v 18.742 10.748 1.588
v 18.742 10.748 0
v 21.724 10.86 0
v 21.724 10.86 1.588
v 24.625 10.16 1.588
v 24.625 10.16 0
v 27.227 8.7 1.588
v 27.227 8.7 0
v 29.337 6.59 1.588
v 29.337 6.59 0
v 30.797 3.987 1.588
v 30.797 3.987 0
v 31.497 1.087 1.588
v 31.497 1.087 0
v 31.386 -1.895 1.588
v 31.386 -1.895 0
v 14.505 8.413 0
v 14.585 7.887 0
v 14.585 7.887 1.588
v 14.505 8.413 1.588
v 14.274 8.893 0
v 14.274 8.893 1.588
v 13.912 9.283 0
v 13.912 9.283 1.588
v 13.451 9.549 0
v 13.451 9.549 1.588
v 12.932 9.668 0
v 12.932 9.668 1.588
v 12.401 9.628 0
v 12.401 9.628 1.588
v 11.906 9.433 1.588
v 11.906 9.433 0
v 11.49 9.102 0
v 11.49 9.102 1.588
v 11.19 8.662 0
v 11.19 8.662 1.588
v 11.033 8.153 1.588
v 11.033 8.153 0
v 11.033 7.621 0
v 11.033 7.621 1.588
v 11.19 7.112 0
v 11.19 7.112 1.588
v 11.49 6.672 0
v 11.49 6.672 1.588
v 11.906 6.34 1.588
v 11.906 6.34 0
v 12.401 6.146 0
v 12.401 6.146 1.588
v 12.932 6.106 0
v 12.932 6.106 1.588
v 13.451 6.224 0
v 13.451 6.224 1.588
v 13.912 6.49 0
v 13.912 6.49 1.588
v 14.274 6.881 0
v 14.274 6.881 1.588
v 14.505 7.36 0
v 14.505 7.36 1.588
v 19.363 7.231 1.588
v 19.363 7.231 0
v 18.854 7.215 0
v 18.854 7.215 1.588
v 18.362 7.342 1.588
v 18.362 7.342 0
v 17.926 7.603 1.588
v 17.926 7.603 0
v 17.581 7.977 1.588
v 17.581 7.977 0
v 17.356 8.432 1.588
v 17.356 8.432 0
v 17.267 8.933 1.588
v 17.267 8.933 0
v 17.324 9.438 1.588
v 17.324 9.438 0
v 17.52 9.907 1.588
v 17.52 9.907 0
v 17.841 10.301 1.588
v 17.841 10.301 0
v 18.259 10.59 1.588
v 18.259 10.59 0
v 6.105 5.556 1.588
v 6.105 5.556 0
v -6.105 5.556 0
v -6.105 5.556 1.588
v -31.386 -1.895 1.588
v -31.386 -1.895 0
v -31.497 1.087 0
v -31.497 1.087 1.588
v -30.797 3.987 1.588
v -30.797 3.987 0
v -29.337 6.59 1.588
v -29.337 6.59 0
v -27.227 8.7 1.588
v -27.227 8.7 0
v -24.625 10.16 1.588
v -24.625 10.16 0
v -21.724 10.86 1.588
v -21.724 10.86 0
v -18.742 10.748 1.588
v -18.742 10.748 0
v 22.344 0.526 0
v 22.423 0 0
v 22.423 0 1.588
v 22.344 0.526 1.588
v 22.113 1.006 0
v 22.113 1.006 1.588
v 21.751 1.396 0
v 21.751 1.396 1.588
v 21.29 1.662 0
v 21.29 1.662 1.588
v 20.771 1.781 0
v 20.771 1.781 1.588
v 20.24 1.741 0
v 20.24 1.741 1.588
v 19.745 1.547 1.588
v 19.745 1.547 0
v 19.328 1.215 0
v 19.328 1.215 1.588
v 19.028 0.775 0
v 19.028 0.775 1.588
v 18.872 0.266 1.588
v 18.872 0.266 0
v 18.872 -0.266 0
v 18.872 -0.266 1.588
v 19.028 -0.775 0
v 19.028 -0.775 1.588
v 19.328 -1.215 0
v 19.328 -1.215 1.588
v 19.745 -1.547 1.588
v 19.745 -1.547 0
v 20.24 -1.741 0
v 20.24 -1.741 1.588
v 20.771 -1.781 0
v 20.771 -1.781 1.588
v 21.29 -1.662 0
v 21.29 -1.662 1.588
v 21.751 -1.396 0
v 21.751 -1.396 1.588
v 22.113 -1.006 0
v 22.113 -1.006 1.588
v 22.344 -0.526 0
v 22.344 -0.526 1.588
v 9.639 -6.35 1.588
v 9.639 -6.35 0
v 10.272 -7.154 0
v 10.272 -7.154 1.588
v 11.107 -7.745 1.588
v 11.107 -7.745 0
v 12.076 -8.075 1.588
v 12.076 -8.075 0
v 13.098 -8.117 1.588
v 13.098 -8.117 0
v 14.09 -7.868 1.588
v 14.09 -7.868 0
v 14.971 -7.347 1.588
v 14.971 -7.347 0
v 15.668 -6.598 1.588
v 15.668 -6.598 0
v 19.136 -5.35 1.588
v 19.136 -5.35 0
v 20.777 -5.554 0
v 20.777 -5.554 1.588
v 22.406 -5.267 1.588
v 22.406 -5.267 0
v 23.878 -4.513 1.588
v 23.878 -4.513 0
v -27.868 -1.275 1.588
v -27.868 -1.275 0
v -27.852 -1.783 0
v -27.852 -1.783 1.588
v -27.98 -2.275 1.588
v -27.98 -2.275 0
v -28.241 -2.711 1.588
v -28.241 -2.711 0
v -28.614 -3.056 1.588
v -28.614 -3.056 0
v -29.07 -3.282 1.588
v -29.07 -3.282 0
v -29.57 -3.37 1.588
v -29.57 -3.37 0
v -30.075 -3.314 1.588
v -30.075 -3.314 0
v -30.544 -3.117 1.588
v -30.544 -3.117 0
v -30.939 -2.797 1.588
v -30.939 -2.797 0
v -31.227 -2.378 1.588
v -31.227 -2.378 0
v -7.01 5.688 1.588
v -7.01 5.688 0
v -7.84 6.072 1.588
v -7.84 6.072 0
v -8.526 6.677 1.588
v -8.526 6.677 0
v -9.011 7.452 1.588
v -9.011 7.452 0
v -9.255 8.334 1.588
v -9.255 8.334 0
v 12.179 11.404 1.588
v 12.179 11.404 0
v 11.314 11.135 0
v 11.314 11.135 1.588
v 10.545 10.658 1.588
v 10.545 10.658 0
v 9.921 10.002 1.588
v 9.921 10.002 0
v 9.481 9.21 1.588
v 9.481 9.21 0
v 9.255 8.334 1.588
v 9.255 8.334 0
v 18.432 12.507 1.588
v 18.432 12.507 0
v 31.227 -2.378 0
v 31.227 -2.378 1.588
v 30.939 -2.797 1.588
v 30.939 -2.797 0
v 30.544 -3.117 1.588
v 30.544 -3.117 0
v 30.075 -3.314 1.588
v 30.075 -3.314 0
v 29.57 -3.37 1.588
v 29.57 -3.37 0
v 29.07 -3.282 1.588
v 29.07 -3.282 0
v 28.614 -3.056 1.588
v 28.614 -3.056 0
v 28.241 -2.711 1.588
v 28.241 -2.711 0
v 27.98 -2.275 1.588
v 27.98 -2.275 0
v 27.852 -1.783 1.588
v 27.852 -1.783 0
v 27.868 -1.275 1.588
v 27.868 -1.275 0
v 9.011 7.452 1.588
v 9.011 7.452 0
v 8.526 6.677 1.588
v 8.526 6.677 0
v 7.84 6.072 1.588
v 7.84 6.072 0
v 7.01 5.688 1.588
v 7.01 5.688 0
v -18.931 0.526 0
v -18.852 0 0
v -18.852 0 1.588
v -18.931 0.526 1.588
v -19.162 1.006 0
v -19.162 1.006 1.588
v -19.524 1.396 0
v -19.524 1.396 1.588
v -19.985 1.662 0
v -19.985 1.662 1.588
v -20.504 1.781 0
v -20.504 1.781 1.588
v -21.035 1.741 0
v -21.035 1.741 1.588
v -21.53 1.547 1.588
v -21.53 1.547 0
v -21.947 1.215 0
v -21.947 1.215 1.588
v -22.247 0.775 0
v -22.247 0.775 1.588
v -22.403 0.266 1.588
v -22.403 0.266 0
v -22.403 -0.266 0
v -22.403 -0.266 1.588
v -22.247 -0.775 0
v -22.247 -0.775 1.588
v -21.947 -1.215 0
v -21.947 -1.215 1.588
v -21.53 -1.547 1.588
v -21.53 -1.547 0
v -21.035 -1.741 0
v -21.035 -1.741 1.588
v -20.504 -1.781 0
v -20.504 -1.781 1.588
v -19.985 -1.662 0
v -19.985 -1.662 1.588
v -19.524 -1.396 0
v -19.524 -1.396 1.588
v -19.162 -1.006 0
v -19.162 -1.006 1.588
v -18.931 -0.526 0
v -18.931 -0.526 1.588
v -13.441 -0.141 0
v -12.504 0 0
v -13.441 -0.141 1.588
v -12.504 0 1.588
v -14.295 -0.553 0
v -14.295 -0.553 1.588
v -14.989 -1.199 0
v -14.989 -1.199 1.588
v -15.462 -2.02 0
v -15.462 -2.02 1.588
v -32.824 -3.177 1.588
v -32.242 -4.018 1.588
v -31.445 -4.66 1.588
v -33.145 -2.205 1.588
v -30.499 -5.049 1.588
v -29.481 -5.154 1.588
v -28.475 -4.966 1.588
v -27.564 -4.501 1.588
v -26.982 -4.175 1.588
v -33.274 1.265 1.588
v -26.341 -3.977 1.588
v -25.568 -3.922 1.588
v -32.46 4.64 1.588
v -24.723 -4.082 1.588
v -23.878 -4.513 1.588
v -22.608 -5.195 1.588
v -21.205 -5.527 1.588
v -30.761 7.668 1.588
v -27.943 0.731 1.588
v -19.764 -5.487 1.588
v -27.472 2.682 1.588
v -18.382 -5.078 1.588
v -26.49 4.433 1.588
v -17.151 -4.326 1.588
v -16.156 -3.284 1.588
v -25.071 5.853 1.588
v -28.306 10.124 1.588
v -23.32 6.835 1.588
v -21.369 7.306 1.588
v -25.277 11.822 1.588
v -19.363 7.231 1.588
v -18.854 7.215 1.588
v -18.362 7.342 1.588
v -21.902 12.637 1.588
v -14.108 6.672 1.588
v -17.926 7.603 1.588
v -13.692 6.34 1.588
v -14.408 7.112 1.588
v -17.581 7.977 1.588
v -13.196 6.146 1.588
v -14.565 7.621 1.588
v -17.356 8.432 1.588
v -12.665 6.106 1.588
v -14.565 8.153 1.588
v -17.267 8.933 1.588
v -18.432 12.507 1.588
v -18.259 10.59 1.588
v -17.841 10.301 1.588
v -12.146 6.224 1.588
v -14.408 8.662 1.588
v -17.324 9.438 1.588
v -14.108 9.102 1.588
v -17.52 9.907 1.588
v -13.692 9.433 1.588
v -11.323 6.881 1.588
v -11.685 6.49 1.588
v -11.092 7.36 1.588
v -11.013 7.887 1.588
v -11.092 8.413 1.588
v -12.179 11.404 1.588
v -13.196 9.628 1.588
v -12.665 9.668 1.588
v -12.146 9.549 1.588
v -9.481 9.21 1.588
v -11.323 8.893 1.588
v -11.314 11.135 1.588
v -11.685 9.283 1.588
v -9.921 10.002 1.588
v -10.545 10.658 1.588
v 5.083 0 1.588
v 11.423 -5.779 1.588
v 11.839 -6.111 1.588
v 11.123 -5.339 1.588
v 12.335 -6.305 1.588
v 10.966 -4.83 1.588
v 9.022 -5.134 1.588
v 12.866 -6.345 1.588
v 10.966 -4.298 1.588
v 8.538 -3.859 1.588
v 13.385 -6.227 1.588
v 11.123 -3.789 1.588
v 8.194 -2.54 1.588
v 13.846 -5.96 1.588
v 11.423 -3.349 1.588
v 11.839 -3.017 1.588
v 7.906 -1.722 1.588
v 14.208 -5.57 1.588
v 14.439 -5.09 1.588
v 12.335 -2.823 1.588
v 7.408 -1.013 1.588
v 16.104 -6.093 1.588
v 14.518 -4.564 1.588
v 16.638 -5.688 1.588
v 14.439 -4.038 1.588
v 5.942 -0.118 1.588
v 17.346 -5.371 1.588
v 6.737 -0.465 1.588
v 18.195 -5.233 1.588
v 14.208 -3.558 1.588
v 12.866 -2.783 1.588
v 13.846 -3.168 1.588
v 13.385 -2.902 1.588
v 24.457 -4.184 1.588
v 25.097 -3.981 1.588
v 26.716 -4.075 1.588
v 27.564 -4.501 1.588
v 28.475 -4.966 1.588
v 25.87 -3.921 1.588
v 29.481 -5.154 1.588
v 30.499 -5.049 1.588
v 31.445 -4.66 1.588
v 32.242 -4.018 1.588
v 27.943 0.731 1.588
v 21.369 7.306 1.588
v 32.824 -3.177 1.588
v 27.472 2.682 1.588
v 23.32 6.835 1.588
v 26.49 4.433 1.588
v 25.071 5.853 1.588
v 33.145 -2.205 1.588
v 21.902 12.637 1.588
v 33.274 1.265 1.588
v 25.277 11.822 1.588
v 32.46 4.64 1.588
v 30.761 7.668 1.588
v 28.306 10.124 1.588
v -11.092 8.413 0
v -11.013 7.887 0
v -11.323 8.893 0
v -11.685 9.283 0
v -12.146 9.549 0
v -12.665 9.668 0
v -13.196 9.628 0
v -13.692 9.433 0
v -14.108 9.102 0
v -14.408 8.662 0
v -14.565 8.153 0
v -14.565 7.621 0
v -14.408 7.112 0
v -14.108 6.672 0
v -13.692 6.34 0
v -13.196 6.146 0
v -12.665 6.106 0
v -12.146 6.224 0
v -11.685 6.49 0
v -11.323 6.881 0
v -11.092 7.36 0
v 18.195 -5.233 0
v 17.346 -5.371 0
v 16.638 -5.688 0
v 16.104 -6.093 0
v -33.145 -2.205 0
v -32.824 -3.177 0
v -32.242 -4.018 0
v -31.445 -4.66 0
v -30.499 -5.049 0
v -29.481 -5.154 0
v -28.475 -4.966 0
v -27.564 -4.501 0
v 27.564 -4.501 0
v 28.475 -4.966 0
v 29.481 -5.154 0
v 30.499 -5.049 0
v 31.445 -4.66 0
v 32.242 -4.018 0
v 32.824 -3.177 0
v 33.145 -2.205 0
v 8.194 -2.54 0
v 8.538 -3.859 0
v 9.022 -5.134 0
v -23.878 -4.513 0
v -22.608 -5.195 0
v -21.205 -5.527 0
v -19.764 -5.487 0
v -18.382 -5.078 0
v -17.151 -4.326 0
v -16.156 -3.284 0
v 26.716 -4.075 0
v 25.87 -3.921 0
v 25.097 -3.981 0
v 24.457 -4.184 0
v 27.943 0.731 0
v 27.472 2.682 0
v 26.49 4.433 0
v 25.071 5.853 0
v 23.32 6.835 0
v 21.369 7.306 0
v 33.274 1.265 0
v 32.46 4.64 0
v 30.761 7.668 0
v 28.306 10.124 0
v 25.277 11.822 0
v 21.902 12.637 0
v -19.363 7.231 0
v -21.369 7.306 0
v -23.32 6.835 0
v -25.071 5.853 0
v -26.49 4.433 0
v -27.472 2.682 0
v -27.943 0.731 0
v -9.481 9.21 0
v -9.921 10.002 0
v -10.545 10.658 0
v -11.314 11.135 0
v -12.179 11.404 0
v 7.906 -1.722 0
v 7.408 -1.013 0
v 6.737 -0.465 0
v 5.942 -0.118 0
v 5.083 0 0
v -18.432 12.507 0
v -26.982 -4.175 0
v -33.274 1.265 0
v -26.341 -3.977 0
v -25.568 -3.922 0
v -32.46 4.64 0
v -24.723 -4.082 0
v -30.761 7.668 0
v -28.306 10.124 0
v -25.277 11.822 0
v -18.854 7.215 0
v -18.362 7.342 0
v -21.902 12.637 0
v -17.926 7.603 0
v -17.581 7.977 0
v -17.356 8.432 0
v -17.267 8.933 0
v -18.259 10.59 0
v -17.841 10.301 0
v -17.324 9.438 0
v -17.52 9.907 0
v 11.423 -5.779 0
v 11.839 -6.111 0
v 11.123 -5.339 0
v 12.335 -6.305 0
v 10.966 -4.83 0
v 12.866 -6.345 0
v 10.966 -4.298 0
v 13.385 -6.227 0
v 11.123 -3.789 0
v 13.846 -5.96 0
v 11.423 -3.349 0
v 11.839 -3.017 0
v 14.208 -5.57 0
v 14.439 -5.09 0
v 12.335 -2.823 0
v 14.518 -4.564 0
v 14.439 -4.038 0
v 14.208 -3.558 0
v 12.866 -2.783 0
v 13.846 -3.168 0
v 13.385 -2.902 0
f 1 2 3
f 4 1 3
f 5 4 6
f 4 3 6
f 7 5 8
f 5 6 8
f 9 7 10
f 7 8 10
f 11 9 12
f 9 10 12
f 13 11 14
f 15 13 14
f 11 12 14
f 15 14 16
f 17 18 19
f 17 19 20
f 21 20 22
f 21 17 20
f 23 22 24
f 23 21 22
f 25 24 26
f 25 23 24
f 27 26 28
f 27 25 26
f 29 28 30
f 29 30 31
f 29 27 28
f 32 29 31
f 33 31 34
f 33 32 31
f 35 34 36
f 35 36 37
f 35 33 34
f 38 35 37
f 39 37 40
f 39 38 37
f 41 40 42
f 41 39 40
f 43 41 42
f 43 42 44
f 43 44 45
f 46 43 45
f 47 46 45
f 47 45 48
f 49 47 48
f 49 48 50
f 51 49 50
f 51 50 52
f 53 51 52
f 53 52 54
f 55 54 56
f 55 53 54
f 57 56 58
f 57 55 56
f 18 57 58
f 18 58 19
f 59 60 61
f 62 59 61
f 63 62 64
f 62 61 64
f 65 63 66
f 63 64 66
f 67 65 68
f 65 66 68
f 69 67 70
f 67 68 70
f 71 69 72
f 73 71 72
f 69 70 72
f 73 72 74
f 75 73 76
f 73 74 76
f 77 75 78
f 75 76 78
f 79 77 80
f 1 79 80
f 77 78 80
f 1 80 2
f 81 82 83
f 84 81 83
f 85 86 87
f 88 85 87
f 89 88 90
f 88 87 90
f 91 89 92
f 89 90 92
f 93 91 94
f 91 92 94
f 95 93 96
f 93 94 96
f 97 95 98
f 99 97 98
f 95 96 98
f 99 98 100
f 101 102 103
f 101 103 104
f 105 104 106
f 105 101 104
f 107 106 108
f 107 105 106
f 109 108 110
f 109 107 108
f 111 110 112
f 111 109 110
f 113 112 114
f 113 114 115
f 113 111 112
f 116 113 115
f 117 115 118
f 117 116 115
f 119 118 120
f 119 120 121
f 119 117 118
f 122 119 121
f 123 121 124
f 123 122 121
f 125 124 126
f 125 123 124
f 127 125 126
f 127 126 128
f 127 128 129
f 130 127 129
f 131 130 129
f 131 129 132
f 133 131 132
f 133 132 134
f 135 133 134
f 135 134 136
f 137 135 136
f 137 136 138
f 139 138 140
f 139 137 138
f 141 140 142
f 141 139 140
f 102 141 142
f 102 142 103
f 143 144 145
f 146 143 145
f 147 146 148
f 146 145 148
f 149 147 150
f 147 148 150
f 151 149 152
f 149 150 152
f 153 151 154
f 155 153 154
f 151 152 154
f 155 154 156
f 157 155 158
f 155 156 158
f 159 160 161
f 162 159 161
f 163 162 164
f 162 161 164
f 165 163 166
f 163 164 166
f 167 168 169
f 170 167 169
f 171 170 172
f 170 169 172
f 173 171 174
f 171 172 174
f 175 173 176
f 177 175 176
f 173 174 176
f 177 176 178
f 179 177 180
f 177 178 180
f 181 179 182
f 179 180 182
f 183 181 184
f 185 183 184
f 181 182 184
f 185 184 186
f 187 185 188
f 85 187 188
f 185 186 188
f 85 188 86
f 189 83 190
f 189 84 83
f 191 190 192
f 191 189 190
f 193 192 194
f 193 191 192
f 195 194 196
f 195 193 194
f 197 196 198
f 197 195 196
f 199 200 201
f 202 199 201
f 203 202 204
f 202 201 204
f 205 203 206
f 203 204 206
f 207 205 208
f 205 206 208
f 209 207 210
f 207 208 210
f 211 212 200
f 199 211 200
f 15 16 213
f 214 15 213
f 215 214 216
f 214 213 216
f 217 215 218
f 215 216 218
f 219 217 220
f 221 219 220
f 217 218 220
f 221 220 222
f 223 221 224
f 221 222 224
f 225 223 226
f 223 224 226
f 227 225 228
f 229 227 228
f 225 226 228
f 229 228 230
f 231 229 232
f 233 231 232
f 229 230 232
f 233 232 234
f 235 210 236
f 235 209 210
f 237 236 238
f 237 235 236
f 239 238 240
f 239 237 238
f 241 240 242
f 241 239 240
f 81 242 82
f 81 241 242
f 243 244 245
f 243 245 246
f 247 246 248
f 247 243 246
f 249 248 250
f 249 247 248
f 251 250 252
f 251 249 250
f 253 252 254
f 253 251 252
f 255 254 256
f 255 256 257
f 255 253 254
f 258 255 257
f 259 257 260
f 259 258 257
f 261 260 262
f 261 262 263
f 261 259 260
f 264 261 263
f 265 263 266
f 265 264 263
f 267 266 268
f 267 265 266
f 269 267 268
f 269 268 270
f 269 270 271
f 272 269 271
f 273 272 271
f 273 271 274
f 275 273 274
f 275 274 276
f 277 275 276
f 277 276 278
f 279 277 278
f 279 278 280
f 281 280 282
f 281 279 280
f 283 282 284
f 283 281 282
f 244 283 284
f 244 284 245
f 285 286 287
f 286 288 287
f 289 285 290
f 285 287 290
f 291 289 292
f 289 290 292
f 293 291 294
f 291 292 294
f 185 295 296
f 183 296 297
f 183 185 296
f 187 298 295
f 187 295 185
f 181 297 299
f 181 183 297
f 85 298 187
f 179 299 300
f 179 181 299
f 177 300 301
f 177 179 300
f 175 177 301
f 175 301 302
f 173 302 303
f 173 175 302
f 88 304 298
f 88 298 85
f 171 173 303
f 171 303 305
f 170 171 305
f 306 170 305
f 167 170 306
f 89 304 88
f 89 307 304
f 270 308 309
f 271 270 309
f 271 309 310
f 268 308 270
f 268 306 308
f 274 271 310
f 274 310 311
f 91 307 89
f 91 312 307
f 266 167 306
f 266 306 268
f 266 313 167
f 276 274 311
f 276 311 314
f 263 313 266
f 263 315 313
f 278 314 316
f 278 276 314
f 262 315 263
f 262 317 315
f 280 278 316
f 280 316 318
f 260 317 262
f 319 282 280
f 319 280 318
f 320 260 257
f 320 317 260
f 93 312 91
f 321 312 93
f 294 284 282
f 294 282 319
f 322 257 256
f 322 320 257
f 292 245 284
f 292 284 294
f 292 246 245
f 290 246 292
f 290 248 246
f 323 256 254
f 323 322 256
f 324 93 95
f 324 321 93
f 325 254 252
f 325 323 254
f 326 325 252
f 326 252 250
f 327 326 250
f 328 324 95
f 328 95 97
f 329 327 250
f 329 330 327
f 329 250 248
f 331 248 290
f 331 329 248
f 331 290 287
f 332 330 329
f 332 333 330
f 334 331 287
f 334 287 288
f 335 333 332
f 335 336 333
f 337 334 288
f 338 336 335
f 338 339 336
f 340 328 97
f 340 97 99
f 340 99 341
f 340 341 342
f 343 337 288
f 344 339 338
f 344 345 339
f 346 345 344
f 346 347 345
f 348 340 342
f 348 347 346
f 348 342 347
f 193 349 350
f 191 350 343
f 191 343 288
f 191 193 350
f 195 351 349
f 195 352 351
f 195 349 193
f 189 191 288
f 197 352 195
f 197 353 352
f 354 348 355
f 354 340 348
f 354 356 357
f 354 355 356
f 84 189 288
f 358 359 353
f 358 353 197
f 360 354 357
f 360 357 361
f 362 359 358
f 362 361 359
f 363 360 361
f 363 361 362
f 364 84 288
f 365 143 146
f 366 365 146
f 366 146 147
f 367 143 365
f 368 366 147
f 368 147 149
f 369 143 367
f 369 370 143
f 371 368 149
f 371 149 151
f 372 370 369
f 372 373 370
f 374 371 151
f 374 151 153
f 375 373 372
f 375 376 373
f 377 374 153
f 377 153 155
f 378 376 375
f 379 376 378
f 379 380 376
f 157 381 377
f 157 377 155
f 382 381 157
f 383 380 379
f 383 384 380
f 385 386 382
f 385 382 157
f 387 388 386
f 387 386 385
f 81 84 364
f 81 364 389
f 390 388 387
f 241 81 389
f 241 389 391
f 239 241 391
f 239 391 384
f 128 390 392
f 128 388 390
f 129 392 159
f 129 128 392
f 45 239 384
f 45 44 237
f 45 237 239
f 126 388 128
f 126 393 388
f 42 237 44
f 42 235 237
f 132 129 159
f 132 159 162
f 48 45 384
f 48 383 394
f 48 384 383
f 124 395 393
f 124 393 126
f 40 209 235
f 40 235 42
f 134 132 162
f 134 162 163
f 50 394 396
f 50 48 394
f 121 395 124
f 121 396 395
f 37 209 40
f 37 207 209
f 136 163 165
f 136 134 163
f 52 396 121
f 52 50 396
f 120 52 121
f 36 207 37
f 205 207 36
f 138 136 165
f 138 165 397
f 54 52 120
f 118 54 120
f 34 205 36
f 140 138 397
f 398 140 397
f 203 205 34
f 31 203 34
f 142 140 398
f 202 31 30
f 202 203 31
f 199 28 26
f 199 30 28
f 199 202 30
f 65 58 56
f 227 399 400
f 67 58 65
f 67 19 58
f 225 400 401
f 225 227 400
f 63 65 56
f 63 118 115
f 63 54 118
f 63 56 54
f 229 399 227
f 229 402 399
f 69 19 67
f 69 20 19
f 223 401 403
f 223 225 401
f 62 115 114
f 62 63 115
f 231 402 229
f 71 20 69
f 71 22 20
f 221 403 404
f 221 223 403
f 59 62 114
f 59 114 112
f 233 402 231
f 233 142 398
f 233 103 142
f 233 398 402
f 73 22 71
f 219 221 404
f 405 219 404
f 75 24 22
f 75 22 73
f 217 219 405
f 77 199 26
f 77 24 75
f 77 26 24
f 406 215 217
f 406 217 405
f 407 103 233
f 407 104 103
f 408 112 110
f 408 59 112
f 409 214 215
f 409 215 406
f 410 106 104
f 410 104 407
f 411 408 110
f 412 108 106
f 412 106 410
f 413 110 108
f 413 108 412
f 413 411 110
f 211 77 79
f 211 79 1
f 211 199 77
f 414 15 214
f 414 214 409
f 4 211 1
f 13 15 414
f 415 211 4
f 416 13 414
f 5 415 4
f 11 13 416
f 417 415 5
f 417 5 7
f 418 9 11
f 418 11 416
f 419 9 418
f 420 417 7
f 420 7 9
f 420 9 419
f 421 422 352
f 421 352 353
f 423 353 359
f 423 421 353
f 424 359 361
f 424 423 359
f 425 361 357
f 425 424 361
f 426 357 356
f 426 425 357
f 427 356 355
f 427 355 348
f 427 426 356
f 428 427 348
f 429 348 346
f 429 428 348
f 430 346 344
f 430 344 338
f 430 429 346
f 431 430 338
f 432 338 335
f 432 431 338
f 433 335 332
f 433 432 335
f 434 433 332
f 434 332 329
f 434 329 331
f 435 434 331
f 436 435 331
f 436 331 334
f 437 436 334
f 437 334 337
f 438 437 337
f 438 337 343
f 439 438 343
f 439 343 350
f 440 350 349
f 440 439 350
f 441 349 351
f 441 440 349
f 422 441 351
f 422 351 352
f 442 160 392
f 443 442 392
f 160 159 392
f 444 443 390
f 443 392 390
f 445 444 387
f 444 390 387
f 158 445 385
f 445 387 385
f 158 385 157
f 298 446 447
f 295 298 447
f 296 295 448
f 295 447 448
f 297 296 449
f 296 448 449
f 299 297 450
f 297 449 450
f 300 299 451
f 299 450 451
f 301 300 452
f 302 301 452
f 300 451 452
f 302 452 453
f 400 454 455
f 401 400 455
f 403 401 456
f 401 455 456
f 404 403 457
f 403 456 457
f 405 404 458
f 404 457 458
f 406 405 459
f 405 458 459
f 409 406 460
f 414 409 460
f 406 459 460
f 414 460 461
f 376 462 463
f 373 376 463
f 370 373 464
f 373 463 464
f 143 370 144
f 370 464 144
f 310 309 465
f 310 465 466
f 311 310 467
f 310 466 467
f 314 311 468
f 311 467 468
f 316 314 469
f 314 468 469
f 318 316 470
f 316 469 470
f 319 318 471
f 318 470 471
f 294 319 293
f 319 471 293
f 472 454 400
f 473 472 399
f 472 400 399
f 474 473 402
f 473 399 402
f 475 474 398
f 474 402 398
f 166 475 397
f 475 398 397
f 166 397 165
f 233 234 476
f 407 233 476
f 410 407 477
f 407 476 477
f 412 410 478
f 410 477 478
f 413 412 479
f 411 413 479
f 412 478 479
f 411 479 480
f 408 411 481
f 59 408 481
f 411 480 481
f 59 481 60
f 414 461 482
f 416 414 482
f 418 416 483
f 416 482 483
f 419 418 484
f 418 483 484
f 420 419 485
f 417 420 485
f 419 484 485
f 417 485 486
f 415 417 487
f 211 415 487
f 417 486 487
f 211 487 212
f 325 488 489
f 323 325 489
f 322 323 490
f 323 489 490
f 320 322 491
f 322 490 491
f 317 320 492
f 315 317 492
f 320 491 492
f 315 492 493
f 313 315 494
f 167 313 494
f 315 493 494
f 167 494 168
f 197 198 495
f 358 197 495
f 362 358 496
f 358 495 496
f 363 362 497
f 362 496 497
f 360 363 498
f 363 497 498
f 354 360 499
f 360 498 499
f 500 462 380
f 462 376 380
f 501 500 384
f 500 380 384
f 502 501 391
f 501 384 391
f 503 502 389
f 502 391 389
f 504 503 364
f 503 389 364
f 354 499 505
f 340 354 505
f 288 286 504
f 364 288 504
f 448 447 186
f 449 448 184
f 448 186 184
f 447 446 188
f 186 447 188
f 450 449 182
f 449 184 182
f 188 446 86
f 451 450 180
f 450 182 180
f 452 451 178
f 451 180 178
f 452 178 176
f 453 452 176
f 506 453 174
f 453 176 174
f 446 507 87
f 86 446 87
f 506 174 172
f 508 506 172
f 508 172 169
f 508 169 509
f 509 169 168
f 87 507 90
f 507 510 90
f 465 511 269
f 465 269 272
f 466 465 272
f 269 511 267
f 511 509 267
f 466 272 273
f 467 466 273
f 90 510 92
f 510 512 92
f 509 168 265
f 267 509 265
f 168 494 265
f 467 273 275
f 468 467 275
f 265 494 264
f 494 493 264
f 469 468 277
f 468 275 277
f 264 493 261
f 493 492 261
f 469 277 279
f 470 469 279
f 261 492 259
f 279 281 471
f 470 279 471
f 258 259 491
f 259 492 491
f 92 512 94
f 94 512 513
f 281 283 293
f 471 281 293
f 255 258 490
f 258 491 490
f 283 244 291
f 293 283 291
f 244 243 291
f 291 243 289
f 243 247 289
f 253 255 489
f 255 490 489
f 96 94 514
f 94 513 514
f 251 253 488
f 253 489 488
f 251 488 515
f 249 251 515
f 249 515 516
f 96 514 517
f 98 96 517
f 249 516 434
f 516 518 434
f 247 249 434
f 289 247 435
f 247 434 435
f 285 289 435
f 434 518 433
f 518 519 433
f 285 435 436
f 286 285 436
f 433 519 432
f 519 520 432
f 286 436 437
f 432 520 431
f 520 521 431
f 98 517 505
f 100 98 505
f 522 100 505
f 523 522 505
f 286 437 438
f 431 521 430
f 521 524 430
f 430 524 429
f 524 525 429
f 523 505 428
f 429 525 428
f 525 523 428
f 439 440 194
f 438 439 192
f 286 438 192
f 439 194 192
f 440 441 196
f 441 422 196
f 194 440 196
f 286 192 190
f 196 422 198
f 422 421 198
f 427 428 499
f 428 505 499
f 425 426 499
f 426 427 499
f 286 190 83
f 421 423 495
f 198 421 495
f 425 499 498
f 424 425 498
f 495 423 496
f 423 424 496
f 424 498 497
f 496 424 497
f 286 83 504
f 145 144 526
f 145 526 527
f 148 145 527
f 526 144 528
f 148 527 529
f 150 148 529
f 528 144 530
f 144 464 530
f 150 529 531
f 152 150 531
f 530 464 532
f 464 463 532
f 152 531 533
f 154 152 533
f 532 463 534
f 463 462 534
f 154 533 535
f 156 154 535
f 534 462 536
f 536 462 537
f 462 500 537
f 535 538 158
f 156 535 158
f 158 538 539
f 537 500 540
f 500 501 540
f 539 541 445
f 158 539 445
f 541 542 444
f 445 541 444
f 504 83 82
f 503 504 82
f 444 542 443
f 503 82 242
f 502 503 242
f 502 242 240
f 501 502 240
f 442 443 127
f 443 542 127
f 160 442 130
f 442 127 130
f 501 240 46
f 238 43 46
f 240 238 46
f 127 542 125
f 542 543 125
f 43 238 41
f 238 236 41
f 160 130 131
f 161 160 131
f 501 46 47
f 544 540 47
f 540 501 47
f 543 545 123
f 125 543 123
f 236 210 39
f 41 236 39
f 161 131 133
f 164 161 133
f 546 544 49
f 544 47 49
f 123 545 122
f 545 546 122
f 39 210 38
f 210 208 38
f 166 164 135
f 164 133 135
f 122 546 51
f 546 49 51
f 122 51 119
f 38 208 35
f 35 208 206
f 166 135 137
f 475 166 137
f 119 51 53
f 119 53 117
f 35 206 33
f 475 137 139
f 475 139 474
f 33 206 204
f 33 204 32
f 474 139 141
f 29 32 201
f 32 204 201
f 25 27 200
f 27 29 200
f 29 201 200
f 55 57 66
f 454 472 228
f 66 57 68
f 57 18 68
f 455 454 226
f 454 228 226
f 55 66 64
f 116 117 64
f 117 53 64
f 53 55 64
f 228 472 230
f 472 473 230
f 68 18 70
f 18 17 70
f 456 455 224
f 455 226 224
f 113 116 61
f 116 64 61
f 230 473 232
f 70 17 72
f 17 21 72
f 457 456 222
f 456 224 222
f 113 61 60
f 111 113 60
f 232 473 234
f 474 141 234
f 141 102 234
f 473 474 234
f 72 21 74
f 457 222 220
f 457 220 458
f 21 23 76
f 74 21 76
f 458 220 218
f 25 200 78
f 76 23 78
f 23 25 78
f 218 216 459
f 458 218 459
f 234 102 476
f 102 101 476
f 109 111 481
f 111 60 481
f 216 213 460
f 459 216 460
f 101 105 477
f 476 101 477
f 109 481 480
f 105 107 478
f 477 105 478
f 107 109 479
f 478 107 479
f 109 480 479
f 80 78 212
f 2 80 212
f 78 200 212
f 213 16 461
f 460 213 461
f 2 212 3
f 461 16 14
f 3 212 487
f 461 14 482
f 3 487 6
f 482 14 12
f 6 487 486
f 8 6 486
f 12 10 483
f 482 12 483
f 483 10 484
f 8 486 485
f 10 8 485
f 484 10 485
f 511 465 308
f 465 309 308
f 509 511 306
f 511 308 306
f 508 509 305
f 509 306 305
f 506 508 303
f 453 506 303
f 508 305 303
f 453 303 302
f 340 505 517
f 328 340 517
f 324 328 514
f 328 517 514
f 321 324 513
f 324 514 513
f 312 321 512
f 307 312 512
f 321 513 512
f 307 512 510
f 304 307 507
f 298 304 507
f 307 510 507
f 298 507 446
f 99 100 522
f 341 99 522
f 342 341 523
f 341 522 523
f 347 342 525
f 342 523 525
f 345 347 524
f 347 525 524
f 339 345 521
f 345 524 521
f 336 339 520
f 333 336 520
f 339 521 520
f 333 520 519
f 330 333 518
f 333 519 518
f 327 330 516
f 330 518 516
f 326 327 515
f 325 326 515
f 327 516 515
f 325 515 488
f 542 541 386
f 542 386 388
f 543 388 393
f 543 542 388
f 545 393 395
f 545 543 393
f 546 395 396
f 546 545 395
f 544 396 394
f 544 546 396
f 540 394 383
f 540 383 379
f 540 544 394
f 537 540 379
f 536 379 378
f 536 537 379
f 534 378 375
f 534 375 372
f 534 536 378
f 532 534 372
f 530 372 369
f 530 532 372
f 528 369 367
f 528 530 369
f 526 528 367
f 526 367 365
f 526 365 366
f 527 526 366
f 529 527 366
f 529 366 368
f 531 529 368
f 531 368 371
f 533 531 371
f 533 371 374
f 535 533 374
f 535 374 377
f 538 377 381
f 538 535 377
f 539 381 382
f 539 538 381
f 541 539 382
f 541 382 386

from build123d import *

# Parameters (mm, degrees)
SKETCH1_R           = 1.7859375
BOSS_EXTRUDE1_DEPTH = 1.5875
FILLET1_R           = 3.175


with BuildPart() as part:
    # Sketch1 → Boss-Extrude1 (new body)
    with BuildSketch(Plane.XY):
        with BuildLine():
            ThreePointArc((33.144558463, -2.205331856), (29.617756121, 8.980256121), (18.432168144, 12.507058463))
            Line((18.432168144, 12.507058463), (12.178638912, 11.404392535))
            ThreePointArc((12.178638912, 11.404392535), (9.43473159, 9.087090354), (10.092061938, 5.55625))
            Line((10.092061938, 5.55625), (-10.092061938, 5.55625))
            ThreePointArc((-10.092061938, 5.55625), (-9.43473159, 9.087090354), (-12.178638912, 11.404392535))
            Line((-12.178638912, 11.404392535), (-18.432168144, 12.507058463))
            ThreePointArc((-18.432168144, 12.507058463), (-29.617756121, 8.980256121), (-33.144558463, -2.205331856))
            ThreePointArc((-33.144558463, -2.205331856), (-29.006698655, -5.102692459), (-26.109338088, -0.964832626))
            ThreePointArc((-26.109338088, -0.964832626), (-20.153240935, -5.535106794), (-15.08125, 0))
            Line((-15.08125, 0), (7.9375, 0))
            ThreePointArc((7.9375, 0), (8.370242006, -3.287001873), (9.638977372, -6.35))
            ThreePointArc((9.638977372, -6.35), (14.51824938, -7.657396978), (15.825646329, -2.778124963))
            ThreePointArc((15.825646329, -2.778124963), (21.602332634, -5.471838087), (26.109338066, -0.964832752))
            ThreePointArc((26.109338066, -0.964832752), (29.006698718, -5.10269247), (33.144558463, -2.205331856))
        make_face()
        with Locations((-20.6375, 0)):
            Circle(SKETCH1_R, mode=Mode.SUBTRACT)
        with Locations((12.732311861, -4.5640625)):
            Circle(SKETCH1_R, mode=Mode.SUBTRACT)
        with Locations((20.6375, 0)):
            Circle(SKETCH1_R, mode=Mode.SUBTRACT)
        with BuildLine():
            ThreePointArc((-31.385753367, -1.895207064), (-28.354907604, 7.717407604), (-18.742292936, 10.748253367))
            ThreePointArc((-18.742292936, 10.748253367), (-17.293612632, 8.679323478), (-19.362542521, 7.230643174))
            ThreePointArc((-19.362542521, 7.230643174), (-25.82921057, 5.19171057), (-27.868143174, -1.274957479))
            ThreePointArc((-27.868143174, -1.274957479), (-29.316823478, -3.343887368), (-31.385753367, -1.895207064))
        make_face(mode=Mode.SUBTRACT)
        with Locations((-12.798888497, 7.886782342)):
            Circle(SKETCH1_R, mode=Mode.SUBTRACT)
        with BuildLine():
            ThreePointArc((18.742292936, 10.748253367), (28.354907604, 7.717407604), (31.385753367, -1.895207064))
            ThreePointArc((31.385753367, -1.895207064), (29.316823478, -3.343887368), (27.868143174, -1.274957479))
            ThreePointArc((27.868143174, -1.274957479), (25.82921057, 5.19171057), (19.362542521, 7.230643174))
            ThreePointArc((19.362542521, 7.230643174), (17.293612632, 8.679323478), (18.742292936, 10.748253367))
        make_face(mode=Mode.SUBTRACT)
        with Locations((12.798888497, 7.886782342)):
            Circle(SKETCH1_R, mode=Mode.SUBTRACT)
    extrude(amount=BOSS_EXTRUDE1_DEPTH)

    # Fillet1
    fillet1_edges = [part.edges().sort_by_distance(p)[0] for p in [
        (26.109338066, -0.964832752, 0.79375),
        (15.825646329, -2.778124963, 0.79375),
        (7.9375, 0, 0.79375),
        (-15.08125, 0, 0.79375),
        (-26.109338088, -0.964832626, 0.79375),
        (-10.092061938, 5.55625, 0.79375),
        (10.092061938, 5.55625, 0.79375),
    ]]
    fillet(fillet1_edges, radius=FILLET1_R)


solid = part.part
